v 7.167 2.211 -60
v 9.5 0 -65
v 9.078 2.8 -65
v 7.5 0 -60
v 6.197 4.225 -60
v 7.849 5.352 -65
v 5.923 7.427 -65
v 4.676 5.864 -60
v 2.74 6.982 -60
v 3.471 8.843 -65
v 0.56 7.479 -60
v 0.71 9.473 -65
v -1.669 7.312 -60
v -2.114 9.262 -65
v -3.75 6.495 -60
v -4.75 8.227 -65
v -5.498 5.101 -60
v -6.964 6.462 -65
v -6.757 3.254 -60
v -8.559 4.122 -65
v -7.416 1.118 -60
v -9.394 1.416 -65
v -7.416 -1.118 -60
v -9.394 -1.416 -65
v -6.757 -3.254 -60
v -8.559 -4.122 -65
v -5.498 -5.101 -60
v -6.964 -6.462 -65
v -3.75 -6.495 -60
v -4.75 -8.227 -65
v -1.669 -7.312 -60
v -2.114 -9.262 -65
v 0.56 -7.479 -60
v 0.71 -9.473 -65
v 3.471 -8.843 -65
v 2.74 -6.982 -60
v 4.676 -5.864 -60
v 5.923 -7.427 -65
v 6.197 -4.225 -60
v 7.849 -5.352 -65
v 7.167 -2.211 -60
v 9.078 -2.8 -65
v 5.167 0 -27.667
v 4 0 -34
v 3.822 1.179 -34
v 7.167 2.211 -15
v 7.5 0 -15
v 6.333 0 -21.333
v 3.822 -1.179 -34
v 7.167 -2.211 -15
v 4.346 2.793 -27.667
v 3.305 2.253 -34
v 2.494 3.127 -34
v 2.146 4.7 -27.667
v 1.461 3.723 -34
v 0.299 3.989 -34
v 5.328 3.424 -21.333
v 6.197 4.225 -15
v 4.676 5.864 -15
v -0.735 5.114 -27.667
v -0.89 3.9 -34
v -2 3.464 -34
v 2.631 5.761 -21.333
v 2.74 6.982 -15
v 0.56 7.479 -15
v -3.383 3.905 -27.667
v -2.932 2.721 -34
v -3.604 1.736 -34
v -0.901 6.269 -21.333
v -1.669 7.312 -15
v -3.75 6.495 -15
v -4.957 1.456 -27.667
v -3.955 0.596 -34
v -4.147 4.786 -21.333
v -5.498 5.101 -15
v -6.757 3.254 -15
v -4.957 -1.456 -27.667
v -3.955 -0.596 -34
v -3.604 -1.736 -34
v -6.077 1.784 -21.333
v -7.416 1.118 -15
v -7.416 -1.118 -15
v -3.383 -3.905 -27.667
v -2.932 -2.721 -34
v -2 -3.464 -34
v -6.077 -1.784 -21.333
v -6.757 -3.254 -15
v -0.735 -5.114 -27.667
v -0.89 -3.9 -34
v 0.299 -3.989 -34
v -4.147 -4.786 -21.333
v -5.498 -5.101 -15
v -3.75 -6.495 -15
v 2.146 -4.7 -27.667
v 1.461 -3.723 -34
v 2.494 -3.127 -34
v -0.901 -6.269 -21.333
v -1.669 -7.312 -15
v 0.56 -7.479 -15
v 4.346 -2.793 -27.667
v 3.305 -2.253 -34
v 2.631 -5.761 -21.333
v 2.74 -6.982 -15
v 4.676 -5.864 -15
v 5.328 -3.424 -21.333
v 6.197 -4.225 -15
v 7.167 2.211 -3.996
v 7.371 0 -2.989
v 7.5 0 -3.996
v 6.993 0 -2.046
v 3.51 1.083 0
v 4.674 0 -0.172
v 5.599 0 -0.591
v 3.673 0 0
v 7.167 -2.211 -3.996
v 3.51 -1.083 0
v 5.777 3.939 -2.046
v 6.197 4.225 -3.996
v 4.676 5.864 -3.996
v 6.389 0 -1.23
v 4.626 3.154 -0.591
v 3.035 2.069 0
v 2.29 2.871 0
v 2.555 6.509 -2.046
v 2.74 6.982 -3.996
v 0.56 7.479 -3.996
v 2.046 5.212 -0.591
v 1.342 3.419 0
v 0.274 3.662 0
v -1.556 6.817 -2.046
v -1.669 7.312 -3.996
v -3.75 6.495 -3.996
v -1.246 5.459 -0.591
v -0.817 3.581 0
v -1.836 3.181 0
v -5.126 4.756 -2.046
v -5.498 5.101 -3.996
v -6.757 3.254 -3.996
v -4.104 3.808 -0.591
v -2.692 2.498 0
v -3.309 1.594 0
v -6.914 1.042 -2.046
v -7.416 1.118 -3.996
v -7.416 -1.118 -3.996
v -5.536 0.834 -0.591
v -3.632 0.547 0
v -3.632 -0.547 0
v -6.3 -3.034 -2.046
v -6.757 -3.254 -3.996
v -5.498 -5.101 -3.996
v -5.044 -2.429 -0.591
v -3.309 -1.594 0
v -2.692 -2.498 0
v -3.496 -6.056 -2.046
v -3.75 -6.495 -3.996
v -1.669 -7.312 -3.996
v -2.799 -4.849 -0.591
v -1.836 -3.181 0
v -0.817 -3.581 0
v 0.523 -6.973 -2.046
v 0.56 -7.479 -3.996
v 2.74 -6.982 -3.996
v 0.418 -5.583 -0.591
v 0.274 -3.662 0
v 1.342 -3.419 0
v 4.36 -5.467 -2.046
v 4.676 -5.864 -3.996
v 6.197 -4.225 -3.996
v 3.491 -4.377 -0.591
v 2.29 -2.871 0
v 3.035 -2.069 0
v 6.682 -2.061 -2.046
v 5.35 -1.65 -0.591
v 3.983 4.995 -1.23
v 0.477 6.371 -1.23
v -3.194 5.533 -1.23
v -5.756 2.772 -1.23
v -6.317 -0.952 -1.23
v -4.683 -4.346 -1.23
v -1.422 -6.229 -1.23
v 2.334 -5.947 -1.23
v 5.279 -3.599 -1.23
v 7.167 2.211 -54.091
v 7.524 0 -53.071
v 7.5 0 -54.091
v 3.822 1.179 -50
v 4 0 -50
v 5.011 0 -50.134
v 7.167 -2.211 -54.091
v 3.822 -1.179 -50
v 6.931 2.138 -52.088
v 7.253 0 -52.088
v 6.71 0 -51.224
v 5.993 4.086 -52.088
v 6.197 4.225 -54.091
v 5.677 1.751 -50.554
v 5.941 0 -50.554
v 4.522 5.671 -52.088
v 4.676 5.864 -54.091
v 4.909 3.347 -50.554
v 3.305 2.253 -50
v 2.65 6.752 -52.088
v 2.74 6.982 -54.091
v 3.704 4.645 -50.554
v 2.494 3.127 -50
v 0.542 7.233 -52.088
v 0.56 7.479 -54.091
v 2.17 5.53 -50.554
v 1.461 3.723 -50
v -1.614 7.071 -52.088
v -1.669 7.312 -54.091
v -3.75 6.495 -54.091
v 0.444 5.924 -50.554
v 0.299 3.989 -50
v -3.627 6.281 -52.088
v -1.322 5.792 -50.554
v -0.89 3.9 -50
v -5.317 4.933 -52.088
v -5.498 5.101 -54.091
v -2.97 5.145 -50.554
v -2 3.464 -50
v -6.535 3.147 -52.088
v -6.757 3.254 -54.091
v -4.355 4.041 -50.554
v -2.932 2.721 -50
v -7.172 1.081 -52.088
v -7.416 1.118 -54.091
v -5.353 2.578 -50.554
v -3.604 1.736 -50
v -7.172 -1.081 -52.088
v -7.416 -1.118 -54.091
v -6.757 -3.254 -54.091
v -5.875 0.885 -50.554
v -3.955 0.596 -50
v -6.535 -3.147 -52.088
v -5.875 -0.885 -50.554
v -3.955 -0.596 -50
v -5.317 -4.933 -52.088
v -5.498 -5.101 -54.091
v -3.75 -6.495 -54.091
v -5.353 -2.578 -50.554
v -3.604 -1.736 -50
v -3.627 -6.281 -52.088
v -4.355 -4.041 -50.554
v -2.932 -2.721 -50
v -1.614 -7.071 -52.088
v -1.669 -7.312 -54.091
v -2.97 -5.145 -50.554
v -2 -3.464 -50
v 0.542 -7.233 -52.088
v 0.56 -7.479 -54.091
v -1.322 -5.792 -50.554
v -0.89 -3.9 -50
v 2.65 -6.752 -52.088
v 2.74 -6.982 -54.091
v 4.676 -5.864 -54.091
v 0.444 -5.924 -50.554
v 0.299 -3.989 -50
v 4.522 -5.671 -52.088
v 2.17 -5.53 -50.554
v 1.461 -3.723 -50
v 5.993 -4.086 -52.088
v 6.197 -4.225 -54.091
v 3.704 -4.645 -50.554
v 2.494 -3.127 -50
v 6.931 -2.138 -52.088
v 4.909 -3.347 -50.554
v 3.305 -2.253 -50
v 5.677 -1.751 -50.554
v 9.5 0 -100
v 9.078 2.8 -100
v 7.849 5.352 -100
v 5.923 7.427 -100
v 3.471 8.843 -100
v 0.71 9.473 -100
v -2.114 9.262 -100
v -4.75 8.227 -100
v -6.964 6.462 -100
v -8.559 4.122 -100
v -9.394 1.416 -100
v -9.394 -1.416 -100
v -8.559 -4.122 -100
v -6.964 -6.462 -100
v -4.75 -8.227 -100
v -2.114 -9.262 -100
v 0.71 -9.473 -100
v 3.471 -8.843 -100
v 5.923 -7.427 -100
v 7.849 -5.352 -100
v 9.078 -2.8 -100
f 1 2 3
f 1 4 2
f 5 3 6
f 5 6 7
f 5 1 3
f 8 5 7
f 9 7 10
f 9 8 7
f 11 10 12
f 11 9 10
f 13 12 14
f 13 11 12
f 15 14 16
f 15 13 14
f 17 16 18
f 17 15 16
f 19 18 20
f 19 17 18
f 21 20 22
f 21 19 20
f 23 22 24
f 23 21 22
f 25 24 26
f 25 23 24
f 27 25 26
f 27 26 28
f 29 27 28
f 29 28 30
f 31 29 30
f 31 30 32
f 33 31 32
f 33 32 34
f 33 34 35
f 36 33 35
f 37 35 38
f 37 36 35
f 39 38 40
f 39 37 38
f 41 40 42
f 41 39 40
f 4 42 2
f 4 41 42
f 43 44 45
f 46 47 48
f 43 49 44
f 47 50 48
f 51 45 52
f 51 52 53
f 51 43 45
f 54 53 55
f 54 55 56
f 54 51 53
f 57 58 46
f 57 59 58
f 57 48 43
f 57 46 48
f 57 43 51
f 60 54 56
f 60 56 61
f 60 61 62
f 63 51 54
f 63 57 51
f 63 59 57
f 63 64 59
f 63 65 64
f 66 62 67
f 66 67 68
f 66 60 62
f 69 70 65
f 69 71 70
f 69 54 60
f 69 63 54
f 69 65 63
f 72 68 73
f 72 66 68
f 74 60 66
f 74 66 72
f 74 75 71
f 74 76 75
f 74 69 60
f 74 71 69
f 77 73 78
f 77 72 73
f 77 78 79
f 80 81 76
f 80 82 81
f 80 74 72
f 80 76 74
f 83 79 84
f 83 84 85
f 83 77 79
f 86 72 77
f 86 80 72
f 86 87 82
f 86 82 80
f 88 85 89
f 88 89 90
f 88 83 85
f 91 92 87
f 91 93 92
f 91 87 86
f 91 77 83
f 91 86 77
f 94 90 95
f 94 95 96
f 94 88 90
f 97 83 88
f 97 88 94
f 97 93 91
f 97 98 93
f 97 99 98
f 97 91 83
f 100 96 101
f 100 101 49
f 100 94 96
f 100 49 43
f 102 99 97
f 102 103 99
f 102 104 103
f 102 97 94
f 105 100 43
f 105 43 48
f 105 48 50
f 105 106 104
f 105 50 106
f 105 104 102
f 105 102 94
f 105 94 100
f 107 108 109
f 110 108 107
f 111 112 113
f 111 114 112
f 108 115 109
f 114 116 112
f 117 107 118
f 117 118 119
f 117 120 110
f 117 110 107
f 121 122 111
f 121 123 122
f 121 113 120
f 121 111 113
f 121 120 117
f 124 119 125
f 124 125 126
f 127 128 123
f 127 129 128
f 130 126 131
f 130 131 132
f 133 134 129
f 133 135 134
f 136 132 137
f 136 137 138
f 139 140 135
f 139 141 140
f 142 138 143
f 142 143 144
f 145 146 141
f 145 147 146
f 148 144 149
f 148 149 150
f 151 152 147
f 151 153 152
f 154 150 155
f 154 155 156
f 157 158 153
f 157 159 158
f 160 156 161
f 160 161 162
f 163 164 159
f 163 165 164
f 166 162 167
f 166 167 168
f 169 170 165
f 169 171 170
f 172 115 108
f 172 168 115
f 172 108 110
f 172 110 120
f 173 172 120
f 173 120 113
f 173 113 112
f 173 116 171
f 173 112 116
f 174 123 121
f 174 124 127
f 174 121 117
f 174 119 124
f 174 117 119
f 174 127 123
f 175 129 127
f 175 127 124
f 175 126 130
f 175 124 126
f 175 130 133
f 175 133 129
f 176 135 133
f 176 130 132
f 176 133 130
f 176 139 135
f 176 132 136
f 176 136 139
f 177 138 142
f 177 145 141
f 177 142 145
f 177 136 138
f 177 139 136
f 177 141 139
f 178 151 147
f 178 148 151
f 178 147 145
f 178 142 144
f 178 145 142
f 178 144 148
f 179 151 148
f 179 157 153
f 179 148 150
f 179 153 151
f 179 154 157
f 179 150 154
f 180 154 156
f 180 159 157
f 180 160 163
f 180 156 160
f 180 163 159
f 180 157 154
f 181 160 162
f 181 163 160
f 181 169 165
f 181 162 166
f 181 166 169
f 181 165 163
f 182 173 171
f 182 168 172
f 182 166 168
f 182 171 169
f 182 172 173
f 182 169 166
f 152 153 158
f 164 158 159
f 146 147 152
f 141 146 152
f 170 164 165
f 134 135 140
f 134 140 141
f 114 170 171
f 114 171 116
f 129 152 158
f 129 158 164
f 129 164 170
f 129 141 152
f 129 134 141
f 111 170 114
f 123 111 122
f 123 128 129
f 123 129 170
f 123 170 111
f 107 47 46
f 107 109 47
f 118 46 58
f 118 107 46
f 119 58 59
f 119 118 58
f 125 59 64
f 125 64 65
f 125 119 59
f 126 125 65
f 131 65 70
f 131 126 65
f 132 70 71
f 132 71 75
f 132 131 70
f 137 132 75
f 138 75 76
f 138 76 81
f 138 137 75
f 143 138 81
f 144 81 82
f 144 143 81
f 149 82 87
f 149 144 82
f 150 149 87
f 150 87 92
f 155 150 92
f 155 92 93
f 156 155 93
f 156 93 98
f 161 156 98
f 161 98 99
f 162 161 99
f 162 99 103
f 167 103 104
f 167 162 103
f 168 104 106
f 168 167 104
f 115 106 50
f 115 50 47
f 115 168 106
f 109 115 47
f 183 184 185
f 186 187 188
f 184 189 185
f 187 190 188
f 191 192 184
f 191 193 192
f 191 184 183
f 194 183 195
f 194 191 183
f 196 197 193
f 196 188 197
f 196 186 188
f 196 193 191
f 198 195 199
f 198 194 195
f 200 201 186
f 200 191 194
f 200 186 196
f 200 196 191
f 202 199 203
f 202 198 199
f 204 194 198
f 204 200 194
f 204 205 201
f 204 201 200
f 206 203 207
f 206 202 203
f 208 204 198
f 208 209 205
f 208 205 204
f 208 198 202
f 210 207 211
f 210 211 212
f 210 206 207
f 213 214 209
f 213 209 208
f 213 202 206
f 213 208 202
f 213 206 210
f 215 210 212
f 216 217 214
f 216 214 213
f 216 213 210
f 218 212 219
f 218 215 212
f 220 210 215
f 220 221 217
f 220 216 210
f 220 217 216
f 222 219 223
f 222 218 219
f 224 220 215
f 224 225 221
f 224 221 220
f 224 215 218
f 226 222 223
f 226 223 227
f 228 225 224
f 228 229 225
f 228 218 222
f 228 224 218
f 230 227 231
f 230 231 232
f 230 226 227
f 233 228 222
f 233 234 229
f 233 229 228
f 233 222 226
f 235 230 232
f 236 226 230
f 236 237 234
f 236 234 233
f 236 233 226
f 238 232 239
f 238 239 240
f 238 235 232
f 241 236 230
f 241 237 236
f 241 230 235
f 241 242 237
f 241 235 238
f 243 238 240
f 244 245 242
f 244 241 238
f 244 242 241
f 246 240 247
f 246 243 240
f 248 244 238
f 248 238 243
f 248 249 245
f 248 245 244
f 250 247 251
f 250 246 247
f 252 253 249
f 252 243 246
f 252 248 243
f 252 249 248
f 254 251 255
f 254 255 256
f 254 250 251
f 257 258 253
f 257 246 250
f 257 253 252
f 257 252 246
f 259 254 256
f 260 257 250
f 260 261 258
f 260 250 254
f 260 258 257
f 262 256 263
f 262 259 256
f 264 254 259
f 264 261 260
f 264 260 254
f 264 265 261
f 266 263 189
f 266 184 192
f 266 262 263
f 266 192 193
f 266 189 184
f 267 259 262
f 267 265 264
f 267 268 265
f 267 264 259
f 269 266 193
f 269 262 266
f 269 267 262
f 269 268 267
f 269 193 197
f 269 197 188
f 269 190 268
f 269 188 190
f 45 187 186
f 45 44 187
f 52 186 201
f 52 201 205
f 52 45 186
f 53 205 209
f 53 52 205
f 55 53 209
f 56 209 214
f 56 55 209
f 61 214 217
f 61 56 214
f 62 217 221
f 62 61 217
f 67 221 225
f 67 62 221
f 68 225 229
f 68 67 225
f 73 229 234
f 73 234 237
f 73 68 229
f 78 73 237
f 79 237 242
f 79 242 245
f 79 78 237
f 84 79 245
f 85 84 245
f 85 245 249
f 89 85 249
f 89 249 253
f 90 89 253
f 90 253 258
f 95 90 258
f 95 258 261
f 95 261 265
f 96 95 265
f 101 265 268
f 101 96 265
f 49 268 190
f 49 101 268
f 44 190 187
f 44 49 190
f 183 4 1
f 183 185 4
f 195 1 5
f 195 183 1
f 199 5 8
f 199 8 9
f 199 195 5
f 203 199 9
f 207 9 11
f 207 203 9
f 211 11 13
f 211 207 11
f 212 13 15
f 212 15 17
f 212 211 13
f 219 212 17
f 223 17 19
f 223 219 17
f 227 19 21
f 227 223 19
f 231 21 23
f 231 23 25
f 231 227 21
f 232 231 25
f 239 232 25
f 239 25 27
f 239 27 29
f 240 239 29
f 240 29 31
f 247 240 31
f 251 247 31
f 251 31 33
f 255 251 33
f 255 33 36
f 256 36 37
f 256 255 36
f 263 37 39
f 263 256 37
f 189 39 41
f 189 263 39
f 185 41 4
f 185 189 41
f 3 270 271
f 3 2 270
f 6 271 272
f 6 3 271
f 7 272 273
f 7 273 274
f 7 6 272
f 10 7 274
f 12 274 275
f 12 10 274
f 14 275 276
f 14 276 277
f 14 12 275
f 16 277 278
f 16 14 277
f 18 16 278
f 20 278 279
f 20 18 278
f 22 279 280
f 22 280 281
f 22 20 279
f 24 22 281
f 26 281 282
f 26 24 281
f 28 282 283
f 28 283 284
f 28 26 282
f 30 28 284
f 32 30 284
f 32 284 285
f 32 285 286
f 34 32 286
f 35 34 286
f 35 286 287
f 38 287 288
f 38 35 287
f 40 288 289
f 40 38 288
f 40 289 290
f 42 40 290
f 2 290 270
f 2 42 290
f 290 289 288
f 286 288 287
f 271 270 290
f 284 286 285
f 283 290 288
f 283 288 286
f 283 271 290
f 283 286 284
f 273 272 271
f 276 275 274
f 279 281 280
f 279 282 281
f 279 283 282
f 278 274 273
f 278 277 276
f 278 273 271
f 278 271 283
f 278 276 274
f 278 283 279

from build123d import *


with BuildPart() as f1:
    # F0 (on Front) → F1 (revolve)
    with BuildSketch(Plane.XZ):
        with BuildLine():
            Line((3.672682, 0), (0, 0))
            Line((0, 0), (0, -100))
            Line((0, -100), (9.5, -100))
            Line((9.5, -100), (9.5, -65))
            Line((9.5, -65), (7.5, -60))
            Line((7.5, -60), (7.5, -54.091204))
            ThreePointArc((7.5, -54.091204), (6.709919, -51.224397), (4, -50))
            Line((4, -50), (4, -34))
            Line((4, -34), (7.5, -15))
            Line((7.5, -15), (7.5, -3.996271))
            ThreePointArc((7.5, -3.996271), (6.388834, -1.22957), (3.672682, 0))
        make_face()
    revolve(axis=Axis((0, 0, -50), (0, 0, 1)))


solid = f1.part
